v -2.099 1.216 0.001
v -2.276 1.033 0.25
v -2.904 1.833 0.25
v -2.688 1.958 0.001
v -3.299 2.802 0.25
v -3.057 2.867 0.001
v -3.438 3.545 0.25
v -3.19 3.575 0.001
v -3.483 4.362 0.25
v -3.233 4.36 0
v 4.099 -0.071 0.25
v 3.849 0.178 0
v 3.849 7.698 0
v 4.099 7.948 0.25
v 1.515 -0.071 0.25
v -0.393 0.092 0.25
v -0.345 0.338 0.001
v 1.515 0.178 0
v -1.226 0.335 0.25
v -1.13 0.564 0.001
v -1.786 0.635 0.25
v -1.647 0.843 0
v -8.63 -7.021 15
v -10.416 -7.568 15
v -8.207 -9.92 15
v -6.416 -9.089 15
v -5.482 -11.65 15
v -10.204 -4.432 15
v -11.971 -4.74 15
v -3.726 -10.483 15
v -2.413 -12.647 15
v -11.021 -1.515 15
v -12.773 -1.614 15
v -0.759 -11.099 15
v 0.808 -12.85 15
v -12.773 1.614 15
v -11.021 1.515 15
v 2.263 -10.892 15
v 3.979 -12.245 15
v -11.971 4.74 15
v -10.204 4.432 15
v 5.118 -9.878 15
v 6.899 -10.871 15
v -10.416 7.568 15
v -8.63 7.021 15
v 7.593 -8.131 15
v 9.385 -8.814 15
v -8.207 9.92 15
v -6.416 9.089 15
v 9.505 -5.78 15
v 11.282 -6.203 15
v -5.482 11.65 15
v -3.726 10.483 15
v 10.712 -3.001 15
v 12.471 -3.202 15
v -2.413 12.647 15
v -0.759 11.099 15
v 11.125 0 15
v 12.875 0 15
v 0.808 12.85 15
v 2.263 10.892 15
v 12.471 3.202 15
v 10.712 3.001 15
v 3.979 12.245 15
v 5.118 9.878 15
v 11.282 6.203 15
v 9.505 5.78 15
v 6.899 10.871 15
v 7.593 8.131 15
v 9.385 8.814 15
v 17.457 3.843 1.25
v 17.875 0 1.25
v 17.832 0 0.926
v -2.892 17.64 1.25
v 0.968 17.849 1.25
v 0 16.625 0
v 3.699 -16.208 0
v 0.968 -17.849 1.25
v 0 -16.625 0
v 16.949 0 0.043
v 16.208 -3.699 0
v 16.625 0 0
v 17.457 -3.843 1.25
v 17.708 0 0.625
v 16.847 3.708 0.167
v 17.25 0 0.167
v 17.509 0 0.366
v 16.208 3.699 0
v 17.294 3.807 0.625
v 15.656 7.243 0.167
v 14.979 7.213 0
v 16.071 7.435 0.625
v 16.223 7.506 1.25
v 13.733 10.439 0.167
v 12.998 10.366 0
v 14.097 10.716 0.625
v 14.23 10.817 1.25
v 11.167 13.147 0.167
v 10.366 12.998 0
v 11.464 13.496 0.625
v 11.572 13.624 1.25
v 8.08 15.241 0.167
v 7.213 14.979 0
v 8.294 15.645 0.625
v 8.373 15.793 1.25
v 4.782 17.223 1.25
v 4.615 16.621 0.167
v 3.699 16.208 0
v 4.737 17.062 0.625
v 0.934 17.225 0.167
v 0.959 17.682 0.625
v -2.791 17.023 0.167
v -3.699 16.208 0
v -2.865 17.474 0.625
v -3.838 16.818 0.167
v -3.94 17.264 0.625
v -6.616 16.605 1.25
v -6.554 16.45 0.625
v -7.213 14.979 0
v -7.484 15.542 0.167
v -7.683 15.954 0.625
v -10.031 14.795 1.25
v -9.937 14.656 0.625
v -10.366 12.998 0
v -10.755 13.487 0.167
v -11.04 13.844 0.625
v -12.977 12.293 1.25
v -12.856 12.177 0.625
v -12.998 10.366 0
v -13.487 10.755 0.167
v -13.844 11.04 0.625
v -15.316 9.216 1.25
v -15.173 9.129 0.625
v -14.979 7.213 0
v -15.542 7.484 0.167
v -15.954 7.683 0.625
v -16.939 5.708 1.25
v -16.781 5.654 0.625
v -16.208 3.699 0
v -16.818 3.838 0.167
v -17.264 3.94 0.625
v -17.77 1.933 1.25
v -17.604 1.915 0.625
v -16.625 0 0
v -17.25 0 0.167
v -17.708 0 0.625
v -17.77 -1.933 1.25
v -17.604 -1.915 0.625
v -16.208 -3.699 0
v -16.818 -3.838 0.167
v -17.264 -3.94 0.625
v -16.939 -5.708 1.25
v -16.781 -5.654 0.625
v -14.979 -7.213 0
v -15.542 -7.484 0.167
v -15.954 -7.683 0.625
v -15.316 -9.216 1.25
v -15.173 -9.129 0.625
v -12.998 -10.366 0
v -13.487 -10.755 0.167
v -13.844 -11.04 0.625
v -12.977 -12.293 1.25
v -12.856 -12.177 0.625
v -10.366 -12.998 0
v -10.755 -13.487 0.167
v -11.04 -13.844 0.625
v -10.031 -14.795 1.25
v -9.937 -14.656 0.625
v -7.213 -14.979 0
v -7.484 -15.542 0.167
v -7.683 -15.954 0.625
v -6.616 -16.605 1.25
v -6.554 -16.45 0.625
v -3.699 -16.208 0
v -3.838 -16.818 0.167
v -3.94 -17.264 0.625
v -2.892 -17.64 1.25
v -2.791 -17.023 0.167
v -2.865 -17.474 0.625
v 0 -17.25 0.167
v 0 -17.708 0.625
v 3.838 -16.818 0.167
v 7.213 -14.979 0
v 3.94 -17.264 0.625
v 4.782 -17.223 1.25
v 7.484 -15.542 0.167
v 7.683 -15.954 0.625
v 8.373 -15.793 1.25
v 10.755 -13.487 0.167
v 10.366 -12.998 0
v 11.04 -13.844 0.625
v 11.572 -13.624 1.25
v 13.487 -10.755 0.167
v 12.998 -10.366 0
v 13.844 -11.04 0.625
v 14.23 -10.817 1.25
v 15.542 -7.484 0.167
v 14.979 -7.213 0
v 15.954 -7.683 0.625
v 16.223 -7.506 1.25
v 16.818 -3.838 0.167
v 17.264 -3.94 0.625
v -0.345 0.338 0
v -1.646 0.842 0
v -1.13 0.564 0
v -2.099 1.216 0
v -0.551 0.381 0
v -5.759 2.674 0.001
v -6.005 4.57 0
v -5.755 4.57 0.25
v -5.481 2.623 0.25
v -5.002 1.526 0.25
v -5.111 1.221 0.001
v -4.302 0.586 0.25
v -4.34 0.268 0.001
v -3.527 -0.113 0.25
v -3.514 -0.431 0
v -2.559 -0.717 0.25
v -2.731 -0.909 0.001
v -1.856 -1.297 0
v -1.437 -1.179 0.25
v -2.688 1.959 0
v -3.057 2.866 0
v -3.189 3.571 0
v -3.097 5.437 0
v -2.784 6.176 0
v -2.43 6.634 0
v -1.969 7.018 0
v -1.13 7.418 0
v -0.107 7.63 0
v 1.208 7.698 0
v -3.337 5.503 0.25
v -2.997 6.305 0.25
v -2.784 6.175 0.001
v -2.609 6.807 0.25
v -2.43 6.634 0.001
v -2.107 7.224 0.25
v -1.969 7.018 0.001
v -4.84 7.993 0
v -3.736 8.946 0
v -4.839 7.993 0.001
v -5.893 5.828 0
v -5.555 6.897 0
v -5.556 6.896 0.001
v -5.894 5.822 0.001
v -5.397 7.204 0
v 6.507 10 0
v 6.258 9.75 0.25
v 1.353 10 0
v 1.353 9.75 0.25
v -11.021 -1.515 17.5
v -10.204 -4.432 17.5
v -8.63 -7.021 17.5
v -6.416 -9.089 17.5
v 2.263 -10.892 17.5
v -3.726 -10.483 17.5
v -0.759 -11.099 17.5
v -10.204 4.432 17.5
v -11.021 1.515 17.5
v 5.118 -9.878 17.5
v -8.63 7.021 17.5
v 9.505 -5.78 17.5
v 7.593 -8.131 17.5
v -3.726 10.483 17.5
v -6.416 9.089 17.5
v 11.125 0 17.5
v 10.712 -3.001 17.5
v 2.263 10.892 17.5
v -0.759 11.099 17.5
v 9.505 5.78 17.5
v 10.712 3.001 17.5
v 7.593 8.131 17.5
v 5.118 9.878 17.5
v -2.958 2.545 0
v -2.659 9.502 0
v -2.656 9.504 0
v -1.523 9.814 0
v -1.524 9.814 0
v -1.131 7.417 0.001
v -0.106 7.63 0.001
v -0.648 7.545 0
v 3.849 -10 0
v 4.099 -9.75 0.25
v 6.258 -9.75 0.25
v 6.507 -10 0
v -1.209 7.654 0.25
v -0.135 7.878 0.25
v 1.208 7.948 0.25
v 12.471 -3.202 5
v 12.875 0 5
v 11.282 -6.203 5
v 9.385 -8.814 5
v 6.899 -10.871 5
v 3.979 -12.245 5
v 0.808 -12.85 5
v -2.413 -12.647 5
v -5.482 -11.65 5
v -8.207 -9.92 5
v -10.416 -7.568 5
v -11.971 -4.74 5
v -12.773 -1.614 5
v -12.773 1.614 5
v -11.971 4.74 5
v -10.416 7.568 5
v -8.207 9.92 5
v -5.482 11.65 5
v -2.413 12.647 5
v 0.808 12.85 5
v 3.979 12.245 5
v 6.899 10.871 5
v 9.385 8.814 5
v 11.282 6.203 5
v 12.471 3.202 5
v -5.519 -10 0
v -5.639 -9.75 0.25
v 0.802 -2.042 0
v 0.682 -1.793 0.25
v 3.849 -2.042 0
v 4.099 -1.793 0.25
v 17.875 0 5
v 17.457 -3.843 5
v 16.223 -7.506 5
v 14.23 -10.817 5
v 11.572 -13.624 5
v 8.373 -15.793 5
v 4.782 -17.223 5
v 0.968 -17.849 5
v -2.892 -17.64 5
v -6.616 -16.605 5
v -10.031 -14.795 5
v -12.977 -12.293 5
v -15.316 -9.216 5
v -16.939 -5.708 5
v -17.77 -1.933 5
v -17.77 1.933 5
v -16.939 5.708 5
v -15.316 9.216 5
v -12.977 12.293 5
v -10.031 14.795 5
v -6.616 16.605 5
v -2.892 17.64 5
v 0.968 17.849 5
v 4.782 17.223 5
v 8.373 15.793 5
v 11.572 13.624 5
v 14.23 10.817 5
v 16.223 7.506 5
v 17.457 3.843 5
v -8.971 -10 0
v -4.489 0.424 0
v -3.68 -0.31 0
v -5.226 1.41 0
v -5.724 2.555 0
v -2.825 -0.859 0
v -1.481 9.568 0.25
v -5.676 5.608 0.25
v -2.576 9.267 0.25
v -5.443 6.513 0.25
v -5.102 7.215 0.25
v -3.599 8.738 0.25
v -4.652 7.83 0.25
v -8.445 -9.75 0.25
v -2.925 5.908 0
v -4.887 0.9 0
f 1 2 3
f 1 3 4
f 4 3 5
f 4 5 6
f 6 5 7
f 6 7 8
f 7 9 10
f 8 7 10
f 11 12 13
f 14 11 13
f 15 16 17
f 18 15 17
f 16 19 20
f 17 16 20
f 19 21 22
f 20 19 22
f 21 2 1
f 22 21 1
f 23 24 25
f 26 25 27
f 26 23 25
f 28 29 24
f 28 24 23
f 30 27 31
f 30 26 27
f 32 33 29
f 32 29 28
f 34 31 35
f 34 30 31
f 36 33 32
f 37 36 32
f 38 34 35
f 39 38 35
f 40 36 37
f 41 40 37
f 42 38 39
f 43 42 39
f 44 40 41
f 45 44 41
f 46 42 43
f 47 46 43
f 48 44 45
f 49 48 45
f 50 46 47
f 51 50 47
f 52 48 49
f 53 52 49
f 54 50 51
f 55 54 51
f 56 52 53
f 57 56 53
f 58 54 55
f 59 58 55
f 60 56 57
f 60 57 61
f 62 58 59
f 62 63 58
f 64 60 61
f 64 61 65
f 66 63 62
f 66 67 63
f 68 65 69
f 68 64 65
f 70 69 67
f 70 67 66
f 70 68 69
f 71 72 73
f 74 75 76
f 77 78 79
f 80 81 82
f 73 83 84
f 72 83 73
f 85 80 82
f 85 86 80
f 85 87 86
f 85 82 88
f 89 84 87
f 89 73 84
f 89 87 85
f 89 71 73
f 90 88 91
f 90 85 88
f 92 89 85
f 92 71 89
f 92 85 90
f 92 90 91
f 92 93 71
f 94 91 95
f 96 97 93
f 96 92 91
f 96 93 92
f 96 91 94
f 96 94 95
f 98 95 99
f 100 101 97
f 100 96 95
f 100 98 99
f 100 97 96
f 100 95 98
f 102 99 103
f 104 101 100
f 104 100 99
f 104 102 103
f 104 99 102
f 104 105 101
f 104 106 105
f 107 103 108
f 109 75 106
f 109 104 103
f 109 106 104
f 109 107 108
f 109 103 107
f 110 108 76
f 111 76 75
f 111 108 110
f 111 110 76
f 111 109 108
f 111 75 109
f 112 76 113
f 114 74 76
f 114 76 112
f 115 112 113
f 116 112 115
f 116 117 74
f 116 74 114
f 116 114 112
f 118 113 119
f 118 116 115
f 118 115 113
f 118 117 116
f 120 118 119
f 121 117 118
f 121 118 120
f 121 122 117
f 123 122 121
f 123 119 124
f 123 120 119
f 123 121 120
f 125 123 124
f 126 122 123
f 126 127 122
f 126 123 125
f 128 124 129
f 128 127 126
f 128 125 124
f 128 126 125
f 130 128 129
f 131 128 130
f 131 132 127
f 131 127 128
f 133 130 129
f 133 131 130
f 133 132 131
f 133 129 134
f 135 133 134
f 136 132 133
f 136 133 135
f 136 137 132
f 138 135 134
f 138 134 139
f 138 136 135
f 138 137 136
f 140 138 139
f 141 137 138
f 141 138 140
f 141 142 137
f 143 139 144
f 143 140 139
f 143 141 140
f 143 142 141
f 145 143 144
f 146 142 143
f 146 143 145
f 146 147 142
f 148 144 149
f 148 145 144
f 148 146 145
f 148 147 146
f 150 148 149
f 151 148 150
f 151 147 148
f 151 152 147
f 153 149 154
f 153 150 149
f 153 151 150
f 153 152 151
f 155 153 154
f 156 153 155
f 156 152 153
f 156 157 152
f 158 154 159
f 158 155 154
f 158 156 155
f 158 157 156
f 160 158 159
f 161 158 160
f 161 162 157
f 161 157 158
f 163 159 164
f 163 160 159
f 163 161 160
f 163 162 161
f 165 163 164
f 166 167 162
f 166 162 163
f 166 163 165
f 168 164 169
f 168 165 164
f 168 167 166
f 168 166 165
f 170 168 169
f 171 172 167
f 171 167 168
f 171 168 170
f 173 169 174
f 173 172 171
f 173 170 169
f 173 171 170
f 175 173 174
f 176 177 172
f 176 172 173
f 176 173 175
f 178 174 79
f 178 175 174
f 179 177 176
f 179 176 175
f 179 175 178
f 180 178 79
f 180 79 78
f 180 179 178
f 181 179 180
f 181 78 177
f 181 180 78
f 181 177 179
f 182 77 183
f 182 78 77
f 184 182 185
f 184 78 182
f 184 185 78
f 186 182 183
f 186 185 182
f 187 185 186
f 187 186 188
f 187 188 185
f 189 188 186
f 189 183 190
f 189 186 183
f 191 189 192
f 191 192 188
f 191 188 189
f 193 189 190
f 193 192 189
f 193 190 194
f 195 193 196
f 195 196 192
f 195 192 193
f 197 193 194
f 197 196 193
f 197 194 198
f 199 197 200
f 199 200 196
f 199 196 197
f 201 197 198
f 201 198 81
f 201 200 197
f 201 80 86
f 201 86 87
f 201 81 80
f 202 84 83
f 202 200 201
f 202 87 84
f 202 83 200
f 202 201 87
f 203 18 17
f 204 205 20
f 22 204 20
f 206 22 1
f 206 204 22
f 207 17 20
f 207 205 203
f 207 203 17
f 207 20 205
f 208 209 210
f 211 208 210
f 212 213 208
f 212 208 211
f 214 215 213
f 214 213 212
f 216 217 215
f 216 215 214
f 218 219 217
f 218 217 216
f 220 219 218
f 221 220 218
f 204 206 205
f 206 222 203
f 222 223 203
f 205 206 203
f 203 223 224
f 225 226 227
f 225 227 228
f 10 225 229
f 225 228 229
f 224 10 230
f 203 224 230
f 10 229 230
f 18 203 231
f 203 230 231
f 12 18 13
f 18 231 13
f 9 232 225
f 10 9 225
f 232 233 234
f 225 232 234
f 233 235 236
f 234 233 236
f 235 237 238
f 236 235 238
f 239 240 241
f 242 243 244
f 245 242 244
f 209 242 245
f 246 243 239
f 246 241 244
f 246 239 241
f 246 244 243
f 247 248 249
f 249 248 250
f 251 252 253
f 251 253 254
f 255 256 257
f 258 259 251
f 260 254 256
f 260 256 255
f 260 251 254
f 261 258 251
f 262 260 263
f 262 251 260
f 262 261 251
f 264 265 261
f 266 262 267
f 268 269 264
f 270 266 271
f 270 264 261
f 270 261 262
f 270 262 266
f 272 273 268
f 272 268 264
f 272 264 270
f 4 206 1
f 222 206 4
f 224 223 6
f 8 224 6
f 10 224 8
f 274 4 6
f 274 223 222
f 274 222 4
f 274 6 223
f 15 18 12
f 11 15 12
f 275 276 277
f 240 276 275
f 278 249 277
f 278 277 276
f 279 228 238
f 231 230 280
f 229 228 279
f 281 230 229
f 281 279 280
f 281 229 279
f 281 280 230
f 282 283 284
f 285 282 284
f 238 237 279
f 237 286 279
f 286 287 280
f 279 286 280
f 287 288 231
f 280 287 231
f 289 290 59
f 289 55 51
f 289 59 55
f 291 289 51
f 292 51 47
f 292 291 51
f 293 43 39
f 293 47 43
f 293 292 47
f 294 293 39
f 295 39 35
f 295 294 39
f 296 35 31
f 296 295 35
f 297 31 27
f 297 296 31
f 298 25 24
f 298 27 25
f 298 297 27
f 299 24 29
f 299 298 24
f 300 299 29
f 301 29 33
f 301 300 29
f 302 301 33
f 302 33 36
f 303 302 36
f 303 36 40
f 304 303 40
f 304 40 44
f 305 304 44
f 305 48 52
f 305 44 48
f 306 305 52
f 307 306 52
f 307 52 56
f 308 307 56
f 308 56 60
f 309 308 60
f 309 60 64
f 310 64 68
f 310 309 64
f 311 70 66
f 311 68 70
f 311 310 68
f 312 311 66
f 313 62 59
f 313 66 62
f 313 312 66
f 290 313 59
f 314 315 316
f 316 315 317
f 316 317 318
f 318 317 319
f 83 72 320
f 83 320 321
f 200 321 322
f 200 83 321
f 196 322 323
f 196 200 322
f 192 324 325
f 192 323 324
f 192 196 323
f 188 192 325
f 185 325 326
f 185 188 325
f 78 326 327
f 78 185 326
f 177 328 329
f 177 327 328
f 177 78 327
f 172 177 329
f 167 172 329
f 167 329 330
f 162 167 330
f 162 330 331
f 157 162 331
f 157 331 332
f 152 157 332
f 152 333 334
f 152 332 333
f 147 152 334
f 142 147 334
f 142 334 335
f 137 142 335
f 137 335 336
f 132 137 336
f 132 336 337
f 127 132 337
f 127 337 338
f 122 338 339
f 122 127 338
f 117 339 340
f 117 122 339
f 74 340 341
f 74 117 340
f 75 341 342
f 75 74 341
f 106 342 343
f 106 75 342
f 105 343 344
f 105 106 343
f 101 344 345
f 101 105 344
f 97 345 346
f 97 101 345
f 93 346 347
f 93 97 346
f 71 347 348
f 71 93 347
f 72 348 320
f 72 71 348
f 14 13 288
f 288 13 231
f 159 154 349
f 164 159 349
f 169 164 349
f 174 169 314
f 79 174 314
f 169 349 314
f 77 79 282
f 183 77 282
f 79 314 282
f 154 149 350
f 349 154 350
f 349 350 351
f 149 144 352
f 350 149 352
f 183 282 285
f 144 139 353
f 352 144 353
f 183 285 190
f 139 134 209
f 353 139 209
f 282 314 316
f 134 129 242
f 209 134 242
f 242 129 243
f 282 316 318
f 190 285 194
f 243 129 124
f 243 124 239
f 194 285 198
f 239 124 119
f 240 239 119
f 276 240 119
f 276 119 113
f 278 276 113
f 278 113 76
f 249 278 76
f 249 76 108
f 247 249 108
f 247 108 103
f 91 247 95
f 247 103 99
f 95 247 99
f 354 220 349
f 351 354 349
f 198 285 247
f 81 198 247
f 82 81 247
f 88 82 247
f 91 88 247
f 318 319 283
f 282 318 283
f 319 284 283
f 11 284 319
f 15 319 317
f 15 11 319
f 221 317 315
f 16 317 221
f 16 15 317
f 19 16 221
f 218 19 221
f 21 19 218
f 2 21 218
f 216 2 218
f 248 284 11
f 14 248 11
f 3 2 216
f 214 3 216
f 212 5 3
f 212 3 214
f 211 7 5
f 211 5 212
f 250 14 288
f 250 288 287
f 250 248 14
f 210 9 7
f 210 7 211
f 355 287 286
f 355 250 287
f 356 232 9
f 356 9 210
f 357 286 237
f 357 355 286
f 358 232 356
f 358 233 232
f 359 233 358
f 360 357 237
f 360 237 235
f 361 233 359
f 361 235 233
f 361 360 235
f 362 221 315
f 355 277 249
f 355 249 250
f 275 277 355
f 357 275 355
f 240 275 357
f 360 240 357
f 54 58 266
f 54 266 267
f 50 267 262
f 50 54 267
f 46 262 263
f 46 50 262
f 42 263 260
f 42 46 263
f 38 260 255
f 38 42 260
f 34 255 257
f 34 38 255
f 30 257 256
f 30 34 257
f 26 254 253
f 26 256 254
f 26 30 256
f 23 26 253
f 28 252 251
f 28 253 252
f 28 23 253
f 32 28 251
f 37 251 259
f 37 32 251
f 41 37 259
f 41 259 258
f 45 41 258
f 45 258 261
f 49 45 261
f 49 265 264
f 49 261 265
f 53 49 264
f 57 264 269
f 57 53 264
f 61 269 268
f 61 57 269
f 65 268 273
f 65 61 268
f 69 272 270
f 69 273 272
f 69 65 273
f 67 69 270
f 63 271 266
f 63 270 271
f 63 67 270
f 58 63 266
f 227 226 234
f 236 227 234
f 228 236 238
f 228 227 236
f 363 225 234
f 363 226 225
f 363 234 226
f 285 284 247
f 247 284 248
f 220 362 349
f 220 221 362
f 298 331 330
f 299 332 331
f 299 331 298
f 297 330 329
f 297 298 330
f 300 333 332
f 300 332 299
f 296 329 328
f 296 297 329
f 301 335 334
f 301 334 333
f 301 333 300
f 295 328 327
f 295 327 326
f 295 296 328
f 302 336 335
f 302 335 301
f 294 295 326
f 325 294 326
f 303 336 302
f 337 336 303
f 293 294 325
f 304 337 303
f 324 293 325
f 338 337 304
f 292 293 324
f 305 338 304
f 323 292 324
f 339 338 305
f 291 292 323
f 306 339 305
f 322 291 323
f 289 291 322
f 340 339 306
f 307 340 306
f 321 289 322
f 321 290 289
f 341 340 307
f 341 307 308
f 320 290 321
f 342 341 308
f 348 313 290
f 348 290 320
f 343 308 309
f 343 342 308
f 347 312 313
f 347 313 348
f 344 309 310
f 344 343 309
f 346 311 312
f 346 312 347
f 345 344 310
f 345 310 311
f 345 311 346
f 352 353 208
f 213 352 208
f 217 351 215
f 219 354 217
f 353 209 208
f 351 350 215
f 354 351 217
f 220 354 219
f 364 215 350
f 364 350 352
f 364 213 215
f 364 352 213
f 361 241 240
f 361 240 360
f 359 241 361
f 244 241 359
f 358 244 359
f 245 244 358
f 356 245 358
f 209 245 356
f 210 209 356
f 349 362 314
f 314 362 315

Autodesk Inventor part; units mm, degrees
ref_plane "YZ Plane" through (0, 0, 0) normal (1, 0, 0) x (0, 1, 0)
ref_plane "XZ Plane" through (0, 0, 0) normal (0, 1, 0) x (-1, 0, 0)
ref_plane "XY Plane" through (0, 0, 0) normal (0, 0, 1) x (1, 0, 0)
sketch "Sketch1" plane through (0, 0, 0) normal (0, 0, 1) x (1, 0, 0)
  circle A0 centre (0, 0) radius 11.125
  circle A1 centre (0, 0) radius 12.875
  circle A2 centre (0, 0) radius 17.875
  dimension "d0" = 22.25
  dimension "d1" = 25.75
  dimension "d2" = 5
extrude "Extrusion1" add sketch "Sketch1" along normal blind 5 contours A0 | A1 | A2
extrude "Extrusion2" add sketch "Sketch1" along normal blind 10 from surface at 5 contours A0 | A1
extrude "Extrusion3" add sketch "Sketch1" along normal blind 2.5 from surface at 15 contours A0
fillet "Fillet1" radius 1.25 1 edges at (-17.875, 0, 0)
sketch "Sketch2" plane through (0, 0, 0) normal (0, 0, -1) x (-1, 0, 0)
  line L0 (-12.5, -12.5) -> (12.5, -12.5)
  line L1 (12.5, -12.5) -> (12.5, 12.5)
  line L2 (12.5, 12.5) -> (-12.5, 12.5)
  line L3 (-12.5, 12.5) -> (-12.5, -12.5)
  line L4 (-12.5, -12.5) -> (12.5, 12.5) construction
  line L5 (12.5, -12.5) -> (-12.5, 12.5) construction
  line L6 (-12.5, 12.5) -> (12.5, 12.5) construction
  line L7 (12.5, 12.5) -> (12.5, -12.5) construction
  line L8 (12.5, -12.5) -> (-12.5, -12.5) construction
  line L9 (-12.5, -12.5) -> (-12.5, 12.5) construction
  line L10 (8.9708, -10) -> (5.5186, -10)
  line L11 (5.5186, -10) -> (-0.8023, -2.0421)
  line L12 (-0.8023, -2.0421) -> (-3.8493, -2.0421)
  line L13 (-3.8493, -2.0421) -> (-3.8493, -10)
  line L14 (-3.8493, -10) -> (-6.5073, -10)
  line L15 (-6.5073, -10) -> (-6.5073, 10)
  line L16 (-6.5073, 10) -> (-1.3533, 10)
  spline S0 degree 2 poles (-1.3533, 10) (0.3647, 10) (2.6823, 9.6272) (3.7358, 8.9465) knots 0 0 0 1 2 2 2
  spline S1 degree 2 poles (3.7358, 8.9465) (4.7893, 8.2658) (6.0049, 6.1426) (6.0049, 4.5705) knots 0 0 0 1 2 2 2
  spline S2 degree 2 poles (6.0049, 4.5705) (6.0049, 2.3825) (3.7682, -0.5835) (1.8558, -1.2966) knots 0 0 0 1 2 2 2
  line L17 (1.8558, -1.2966) -> (8.9708, -10)
  spline S3 degree 2 poles (3.2334, 4.3598) (3.2334, 5.235) (2.6175, 6.5802) (1.9692, 7.0178) knots 0 0 0 1 2 2 2
  spline S4 degree 2 poles (1.9692, 7.0178) (1.4019, 7.3906) (-0.1053, 7.6985) (-1.2075, 7.6985) knots 0 0 0 1 2 2 2
  line L18 (-1.2075, 7.6985) -> (-3.8493, 7.6985)
  line L19 (-3.8493, 7.6985) -> (-3.8493, 0.1783)
  line L20 (-3.8493, 0.1783) -> (-1.5154, 0.1783)
  spline S5 degree 2 poles (-1.5154, 0.1783) (-0.3647, 0.1783) (1.4668, 0.5835) (2.0989, 1.2156) knots 0 0 0 1 2 2 2
  spline S6 degree 2 poles (2.0989, 1.2156) (2.6823, 1.7666) (3.2334, 3.3225) (3.2334, 4.3598) knots 0 0 0 1 2 2 2
  point P0 (0, 0)
  dimension "d10" = 25
  dimension "d11" = 25
extrude "Extrusion4" cut sketch "Sketch2" against normal blind 0.25 contours L10 L11 L12 L13 L14 L15 L16 S0 S1 S2 L17
chamfer "Chamfer1" distance 0.25 angle 45 18 edges at (-7.2447, -10, 0.25) (-2.3582, -6.0211, 0.25) (2.3258, -2.0421, 0.25) (3.8493, -6.0211, 0.25) (5.1783, -10, 0.25) (6.5073, 0, 0.25) (3.9303, 10, 0.25) (-1.5235, 9.8136, 0.25) (-5.3971, 7.2042, 0.25) (-4.8865, 0.8995, 0.25) (-5.4133, -5.6483, 0.25) (-2.9579, 2.5446, 0.25) (-2.9254, 5.9076, 0.25) (-0.6483, 7.5446, 0.25) (2.5284, 7.6985, 0.25) (3.8493, 3.9384, 0.25) (2.6823, 0.1783, 0.25) (-0.5511, 0.3809, 0.25)
properties part number "SM1 Removal Tool"
